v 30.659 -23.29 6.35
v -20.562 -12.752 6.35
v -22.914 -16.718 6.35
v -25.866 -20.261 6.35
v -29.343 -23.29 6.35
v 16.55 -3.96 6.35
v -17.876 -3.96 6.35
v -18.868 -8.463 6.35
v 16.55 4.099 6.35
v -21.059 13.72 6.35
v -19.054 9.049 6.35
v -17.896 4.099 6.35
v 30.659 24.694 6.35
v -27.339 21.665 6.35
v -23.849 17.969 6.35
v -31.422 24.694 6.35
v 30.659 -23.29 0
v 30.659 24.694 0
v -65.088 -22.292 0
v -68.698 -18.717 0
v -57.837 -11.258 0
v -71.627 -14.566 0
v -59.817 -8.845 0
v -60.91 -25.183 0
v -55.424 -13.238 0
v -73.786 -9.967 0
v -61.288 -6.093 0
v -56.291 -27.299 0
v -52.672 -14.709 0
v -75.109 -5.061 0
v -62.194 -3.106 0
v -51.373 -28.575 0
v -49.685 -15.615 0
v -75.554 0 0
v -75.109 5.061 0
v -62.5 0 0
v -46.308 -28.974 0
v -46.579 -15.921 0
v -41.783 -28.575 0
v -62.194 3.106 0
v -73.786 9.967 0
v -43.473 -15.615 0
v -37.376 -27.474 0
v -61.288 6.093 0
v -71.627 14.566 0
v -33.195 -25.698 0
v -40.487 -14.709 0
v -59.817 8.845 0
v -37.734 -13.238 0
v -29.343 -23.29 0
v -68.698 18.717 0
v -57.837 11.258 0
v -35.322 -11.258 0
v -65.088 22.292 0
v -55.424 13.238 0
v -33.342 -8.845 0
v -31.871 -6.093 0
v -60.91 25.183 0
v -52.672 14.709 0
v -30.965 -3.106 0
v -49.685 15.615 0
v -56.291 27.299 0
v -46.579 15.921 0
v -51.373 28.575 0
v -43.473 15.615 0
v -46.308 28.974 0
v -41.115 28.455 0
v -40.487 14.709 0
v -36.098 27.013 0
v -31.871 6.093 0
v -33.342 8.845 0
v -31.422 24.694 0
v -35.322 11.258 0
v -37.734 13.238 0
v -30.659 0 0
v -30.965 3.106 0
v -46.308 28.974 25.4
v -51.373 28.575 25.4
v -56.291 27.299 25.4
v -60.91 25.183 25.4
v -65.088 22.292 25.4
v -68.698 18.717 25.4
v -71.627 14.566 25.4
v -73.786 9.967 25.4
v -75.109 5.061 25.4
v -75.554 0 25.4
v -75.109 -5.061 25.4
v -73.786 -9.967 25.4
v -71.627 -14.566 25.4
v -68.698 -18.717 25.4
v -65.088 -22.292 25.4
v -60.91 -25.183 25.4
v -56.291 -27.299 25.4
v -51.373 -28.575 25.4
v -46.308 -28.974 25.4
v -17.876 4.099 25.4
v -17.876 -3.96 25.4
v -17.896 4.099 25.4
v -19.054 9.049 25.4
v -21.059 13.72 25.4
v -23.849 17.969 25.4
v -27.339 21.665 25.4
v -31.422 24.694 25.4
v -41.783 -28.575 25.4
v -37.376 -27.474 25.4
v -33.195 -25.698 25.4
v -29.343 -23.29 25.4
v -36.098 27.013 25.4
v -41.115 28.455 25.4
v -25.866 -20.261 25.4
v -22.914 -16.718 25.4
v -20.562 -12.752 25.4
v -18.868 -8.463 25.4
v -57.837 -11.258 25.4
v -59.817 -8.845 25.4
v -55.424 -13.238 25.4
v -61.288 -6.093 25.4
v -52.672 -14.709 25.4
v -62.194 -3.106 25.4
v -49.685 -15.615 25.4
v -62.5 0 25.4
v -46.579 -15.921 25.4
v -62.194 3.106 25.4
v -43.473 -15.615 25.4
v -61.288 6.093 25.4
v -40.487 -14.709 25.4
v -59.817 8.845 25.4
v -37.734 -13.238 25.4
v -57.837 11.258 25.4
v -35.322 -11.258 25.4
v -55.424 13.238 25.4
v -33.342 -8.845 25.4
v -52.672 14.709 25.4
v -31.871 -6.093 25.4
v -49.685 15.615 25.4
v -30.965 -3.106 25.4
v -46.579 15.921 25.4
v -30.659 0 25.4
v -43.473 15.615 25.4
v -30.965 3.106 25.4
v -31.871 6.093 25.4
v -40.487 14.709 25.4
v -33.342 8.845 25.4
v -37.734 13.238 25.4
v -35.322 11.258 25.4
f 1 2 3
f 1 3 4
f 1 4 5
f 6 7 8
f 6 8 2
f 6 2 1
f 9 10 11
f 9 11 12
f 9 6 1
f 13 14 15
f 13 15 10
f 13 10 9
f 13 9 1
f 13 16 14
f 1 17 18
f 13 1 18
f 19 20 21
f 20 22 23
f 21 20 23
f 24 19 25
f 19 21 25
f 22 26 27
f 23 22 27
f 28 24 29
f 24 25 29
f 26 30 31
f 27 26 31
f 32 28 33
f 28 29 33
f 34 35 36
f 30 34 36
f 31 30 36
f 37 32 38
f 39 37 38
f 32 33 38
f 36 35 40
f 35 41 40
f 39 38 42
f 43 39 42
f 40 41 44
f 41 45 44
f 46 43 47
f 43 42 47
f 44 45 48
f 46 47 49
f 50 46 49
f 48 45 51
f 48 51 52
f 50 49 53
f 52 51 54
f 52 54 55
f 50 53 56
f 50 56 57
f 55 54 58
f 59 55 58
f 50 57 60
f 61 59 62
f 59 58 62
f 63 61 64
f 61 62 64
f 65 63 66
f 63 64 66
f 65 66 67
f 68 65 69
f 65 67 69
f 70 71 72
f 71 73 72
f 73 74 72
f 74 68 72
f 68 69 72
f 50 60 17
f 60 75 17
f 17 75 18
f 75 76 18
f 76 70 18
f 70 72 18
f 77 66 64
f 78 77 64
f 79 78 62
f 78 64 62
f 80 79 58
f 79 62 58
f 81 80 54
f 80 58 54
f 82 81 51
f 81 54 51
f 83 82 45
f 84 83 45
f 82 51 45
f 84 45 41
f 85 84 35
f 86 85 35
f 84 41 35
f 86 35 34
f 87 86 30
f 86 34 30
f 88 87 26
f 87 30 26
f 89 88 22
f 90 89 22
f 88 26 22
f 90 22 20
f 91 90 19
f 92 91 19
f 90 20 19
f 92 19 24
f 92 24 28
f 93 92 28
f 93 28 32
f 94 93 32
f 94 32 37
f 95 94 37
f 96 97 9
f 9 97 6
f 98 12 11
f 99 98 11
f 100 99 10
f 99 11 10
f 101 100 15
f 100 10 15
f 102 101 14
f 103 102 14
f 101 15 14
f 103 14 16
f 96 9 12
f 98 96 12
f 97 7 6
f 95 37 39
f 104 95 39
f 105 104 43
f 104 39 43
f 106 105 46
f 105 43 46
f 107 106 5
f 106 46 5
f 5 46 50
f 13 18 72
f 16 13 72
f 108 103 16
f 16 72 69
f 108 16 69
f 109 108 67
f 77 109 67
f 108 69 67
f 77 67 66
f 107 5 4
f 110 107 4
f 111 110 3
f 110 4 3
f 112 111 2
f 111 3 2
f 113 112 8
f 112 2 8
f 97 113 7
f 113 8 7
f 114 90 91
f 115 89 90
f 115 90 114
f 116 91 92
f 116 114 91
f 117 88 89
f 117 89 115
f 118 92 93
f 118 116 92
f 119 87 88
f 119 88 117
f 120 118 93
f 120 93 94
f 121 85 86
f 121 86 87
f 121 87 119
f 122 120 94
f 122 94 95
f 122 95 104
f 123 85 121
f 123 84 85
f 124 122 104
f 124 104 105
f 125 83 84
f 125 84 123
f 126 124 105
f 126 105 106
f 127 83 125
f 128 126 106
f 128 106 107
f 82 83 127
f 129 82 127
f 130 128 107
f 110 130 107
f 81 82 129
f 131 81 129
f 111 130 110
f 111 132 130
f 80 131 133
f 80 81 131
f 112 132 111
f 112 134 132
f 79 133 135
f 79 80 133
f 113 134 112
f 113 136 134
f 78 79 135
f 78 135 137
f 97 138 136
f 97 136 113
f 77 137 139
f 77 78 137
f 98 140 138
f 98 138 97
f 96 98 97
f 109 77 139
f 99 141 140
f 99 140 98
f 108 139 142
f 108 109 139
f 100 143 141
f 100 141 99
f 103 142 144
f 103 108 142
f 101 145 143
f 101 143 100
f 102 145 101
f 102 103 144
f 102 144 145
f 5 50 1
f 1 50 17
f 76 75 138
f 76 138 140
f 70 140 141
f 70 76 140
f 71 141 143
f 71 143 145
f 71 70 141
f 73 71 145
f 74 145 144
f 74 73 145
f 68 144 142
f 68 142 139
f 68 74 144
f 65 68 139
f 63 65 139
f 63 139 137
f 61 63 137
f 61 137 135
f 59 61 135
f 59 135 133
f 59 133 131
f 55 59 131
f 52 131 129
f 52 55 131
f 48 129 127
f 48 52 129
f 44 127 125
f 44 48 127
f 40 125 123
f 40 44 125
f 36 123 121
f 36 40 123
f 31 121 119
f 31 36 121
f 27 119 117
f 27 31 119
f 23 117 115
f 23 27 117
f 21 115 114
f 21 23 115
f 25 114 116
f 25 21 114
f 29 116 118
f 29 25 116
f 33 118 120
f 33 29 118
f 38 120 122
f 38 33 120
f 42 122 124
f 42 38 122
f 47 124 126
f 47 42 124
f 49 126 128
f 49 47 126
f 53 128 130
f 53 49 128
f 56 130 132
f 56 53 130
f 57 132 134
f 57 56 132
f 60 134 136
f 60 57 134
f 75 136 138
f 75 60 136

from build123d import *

# Parameters (mm, degrees)
F0_R     = 15.920661
F1_DEPTH = 25.4
F2_DEPTH = 6.35
F4_DEPTH = 19.05
F6_DEPTH = 1752.6


with BuildPart() as f1:
    # F0 (on Top) → F1 (new body)
    with BuildSketch(Plane.XY):
        with BuildLine():
            ThreePointArc((-31.421627, 24.693735), (-38.573704, 27.846859), (-46.308367, 28.973528))
            ThreePointArc((-46.308367, 28.973528), (-75.554202, 0), (-46.308367, -28.973528))
            ThreePointArc((-46.308367, -28.973528), (-37.375926, -27.474257), (-29.342811, -23.290312))
            ThreePointArc((-29.342811, -23.290312), (-17.631762, 1.2541), (-31.421627, 24.693735))
        make_face()
        with Locations((-46.579406, 0)):
            Circle(F0_R, mode=Mode.SUBTRACT)
    extrude(amount=F1_DEPTH)

    # F0 (on Top) → F2 (join)
    with BuildSketch(Plane.XY):
        with BuildLine():
            Line((30.658745, 24.693735), (-31.421627, 24.693735))
            ThreePointArc((-31.421627, 24.693735), (-17.631762, 1.2541), (-29.342811, -23.290312))
            Line((-29.342811, -23.290312), (30.658745, -23.290312))
            Line((30.658745, -23.290312), (30.658745, 0))
            Line((30.658745, 0), (30.658745, 24.693735))
        make_face()
    extrude(amount=F2_DEPTH)

    # F3 (on face) → F4 (join)
    with BuildSketch(Plane.XY.offset(6.35)):
        with BuildLine():
            Line((16.550291, 4.09937), (-17.896066, 4.09937))
            ThreePointArc((-17.896066, 4.09937), (-17.604695, 0.070426), (-17.876477, -3.959886))
            Line((-17.876477, -3.959886), (16.550291, -3.959886))
            Line((16.550291, -3.959886), (16.550291, 4.09937))
        make_face()
    extrude(amount=F4_DEPTH)

    # F5 (on face) → F6 (cut)
    with BuildSketch(Plane.XZ.offset(3.959886)):
        Polygon((16.550291, 25.4), (-17.876477, 25.4), (16.550291, 6.35), align=None)
    extrude(amount=-F6_DEPTH, mode=Mode.SUBTRACT)


solid = f1.part
